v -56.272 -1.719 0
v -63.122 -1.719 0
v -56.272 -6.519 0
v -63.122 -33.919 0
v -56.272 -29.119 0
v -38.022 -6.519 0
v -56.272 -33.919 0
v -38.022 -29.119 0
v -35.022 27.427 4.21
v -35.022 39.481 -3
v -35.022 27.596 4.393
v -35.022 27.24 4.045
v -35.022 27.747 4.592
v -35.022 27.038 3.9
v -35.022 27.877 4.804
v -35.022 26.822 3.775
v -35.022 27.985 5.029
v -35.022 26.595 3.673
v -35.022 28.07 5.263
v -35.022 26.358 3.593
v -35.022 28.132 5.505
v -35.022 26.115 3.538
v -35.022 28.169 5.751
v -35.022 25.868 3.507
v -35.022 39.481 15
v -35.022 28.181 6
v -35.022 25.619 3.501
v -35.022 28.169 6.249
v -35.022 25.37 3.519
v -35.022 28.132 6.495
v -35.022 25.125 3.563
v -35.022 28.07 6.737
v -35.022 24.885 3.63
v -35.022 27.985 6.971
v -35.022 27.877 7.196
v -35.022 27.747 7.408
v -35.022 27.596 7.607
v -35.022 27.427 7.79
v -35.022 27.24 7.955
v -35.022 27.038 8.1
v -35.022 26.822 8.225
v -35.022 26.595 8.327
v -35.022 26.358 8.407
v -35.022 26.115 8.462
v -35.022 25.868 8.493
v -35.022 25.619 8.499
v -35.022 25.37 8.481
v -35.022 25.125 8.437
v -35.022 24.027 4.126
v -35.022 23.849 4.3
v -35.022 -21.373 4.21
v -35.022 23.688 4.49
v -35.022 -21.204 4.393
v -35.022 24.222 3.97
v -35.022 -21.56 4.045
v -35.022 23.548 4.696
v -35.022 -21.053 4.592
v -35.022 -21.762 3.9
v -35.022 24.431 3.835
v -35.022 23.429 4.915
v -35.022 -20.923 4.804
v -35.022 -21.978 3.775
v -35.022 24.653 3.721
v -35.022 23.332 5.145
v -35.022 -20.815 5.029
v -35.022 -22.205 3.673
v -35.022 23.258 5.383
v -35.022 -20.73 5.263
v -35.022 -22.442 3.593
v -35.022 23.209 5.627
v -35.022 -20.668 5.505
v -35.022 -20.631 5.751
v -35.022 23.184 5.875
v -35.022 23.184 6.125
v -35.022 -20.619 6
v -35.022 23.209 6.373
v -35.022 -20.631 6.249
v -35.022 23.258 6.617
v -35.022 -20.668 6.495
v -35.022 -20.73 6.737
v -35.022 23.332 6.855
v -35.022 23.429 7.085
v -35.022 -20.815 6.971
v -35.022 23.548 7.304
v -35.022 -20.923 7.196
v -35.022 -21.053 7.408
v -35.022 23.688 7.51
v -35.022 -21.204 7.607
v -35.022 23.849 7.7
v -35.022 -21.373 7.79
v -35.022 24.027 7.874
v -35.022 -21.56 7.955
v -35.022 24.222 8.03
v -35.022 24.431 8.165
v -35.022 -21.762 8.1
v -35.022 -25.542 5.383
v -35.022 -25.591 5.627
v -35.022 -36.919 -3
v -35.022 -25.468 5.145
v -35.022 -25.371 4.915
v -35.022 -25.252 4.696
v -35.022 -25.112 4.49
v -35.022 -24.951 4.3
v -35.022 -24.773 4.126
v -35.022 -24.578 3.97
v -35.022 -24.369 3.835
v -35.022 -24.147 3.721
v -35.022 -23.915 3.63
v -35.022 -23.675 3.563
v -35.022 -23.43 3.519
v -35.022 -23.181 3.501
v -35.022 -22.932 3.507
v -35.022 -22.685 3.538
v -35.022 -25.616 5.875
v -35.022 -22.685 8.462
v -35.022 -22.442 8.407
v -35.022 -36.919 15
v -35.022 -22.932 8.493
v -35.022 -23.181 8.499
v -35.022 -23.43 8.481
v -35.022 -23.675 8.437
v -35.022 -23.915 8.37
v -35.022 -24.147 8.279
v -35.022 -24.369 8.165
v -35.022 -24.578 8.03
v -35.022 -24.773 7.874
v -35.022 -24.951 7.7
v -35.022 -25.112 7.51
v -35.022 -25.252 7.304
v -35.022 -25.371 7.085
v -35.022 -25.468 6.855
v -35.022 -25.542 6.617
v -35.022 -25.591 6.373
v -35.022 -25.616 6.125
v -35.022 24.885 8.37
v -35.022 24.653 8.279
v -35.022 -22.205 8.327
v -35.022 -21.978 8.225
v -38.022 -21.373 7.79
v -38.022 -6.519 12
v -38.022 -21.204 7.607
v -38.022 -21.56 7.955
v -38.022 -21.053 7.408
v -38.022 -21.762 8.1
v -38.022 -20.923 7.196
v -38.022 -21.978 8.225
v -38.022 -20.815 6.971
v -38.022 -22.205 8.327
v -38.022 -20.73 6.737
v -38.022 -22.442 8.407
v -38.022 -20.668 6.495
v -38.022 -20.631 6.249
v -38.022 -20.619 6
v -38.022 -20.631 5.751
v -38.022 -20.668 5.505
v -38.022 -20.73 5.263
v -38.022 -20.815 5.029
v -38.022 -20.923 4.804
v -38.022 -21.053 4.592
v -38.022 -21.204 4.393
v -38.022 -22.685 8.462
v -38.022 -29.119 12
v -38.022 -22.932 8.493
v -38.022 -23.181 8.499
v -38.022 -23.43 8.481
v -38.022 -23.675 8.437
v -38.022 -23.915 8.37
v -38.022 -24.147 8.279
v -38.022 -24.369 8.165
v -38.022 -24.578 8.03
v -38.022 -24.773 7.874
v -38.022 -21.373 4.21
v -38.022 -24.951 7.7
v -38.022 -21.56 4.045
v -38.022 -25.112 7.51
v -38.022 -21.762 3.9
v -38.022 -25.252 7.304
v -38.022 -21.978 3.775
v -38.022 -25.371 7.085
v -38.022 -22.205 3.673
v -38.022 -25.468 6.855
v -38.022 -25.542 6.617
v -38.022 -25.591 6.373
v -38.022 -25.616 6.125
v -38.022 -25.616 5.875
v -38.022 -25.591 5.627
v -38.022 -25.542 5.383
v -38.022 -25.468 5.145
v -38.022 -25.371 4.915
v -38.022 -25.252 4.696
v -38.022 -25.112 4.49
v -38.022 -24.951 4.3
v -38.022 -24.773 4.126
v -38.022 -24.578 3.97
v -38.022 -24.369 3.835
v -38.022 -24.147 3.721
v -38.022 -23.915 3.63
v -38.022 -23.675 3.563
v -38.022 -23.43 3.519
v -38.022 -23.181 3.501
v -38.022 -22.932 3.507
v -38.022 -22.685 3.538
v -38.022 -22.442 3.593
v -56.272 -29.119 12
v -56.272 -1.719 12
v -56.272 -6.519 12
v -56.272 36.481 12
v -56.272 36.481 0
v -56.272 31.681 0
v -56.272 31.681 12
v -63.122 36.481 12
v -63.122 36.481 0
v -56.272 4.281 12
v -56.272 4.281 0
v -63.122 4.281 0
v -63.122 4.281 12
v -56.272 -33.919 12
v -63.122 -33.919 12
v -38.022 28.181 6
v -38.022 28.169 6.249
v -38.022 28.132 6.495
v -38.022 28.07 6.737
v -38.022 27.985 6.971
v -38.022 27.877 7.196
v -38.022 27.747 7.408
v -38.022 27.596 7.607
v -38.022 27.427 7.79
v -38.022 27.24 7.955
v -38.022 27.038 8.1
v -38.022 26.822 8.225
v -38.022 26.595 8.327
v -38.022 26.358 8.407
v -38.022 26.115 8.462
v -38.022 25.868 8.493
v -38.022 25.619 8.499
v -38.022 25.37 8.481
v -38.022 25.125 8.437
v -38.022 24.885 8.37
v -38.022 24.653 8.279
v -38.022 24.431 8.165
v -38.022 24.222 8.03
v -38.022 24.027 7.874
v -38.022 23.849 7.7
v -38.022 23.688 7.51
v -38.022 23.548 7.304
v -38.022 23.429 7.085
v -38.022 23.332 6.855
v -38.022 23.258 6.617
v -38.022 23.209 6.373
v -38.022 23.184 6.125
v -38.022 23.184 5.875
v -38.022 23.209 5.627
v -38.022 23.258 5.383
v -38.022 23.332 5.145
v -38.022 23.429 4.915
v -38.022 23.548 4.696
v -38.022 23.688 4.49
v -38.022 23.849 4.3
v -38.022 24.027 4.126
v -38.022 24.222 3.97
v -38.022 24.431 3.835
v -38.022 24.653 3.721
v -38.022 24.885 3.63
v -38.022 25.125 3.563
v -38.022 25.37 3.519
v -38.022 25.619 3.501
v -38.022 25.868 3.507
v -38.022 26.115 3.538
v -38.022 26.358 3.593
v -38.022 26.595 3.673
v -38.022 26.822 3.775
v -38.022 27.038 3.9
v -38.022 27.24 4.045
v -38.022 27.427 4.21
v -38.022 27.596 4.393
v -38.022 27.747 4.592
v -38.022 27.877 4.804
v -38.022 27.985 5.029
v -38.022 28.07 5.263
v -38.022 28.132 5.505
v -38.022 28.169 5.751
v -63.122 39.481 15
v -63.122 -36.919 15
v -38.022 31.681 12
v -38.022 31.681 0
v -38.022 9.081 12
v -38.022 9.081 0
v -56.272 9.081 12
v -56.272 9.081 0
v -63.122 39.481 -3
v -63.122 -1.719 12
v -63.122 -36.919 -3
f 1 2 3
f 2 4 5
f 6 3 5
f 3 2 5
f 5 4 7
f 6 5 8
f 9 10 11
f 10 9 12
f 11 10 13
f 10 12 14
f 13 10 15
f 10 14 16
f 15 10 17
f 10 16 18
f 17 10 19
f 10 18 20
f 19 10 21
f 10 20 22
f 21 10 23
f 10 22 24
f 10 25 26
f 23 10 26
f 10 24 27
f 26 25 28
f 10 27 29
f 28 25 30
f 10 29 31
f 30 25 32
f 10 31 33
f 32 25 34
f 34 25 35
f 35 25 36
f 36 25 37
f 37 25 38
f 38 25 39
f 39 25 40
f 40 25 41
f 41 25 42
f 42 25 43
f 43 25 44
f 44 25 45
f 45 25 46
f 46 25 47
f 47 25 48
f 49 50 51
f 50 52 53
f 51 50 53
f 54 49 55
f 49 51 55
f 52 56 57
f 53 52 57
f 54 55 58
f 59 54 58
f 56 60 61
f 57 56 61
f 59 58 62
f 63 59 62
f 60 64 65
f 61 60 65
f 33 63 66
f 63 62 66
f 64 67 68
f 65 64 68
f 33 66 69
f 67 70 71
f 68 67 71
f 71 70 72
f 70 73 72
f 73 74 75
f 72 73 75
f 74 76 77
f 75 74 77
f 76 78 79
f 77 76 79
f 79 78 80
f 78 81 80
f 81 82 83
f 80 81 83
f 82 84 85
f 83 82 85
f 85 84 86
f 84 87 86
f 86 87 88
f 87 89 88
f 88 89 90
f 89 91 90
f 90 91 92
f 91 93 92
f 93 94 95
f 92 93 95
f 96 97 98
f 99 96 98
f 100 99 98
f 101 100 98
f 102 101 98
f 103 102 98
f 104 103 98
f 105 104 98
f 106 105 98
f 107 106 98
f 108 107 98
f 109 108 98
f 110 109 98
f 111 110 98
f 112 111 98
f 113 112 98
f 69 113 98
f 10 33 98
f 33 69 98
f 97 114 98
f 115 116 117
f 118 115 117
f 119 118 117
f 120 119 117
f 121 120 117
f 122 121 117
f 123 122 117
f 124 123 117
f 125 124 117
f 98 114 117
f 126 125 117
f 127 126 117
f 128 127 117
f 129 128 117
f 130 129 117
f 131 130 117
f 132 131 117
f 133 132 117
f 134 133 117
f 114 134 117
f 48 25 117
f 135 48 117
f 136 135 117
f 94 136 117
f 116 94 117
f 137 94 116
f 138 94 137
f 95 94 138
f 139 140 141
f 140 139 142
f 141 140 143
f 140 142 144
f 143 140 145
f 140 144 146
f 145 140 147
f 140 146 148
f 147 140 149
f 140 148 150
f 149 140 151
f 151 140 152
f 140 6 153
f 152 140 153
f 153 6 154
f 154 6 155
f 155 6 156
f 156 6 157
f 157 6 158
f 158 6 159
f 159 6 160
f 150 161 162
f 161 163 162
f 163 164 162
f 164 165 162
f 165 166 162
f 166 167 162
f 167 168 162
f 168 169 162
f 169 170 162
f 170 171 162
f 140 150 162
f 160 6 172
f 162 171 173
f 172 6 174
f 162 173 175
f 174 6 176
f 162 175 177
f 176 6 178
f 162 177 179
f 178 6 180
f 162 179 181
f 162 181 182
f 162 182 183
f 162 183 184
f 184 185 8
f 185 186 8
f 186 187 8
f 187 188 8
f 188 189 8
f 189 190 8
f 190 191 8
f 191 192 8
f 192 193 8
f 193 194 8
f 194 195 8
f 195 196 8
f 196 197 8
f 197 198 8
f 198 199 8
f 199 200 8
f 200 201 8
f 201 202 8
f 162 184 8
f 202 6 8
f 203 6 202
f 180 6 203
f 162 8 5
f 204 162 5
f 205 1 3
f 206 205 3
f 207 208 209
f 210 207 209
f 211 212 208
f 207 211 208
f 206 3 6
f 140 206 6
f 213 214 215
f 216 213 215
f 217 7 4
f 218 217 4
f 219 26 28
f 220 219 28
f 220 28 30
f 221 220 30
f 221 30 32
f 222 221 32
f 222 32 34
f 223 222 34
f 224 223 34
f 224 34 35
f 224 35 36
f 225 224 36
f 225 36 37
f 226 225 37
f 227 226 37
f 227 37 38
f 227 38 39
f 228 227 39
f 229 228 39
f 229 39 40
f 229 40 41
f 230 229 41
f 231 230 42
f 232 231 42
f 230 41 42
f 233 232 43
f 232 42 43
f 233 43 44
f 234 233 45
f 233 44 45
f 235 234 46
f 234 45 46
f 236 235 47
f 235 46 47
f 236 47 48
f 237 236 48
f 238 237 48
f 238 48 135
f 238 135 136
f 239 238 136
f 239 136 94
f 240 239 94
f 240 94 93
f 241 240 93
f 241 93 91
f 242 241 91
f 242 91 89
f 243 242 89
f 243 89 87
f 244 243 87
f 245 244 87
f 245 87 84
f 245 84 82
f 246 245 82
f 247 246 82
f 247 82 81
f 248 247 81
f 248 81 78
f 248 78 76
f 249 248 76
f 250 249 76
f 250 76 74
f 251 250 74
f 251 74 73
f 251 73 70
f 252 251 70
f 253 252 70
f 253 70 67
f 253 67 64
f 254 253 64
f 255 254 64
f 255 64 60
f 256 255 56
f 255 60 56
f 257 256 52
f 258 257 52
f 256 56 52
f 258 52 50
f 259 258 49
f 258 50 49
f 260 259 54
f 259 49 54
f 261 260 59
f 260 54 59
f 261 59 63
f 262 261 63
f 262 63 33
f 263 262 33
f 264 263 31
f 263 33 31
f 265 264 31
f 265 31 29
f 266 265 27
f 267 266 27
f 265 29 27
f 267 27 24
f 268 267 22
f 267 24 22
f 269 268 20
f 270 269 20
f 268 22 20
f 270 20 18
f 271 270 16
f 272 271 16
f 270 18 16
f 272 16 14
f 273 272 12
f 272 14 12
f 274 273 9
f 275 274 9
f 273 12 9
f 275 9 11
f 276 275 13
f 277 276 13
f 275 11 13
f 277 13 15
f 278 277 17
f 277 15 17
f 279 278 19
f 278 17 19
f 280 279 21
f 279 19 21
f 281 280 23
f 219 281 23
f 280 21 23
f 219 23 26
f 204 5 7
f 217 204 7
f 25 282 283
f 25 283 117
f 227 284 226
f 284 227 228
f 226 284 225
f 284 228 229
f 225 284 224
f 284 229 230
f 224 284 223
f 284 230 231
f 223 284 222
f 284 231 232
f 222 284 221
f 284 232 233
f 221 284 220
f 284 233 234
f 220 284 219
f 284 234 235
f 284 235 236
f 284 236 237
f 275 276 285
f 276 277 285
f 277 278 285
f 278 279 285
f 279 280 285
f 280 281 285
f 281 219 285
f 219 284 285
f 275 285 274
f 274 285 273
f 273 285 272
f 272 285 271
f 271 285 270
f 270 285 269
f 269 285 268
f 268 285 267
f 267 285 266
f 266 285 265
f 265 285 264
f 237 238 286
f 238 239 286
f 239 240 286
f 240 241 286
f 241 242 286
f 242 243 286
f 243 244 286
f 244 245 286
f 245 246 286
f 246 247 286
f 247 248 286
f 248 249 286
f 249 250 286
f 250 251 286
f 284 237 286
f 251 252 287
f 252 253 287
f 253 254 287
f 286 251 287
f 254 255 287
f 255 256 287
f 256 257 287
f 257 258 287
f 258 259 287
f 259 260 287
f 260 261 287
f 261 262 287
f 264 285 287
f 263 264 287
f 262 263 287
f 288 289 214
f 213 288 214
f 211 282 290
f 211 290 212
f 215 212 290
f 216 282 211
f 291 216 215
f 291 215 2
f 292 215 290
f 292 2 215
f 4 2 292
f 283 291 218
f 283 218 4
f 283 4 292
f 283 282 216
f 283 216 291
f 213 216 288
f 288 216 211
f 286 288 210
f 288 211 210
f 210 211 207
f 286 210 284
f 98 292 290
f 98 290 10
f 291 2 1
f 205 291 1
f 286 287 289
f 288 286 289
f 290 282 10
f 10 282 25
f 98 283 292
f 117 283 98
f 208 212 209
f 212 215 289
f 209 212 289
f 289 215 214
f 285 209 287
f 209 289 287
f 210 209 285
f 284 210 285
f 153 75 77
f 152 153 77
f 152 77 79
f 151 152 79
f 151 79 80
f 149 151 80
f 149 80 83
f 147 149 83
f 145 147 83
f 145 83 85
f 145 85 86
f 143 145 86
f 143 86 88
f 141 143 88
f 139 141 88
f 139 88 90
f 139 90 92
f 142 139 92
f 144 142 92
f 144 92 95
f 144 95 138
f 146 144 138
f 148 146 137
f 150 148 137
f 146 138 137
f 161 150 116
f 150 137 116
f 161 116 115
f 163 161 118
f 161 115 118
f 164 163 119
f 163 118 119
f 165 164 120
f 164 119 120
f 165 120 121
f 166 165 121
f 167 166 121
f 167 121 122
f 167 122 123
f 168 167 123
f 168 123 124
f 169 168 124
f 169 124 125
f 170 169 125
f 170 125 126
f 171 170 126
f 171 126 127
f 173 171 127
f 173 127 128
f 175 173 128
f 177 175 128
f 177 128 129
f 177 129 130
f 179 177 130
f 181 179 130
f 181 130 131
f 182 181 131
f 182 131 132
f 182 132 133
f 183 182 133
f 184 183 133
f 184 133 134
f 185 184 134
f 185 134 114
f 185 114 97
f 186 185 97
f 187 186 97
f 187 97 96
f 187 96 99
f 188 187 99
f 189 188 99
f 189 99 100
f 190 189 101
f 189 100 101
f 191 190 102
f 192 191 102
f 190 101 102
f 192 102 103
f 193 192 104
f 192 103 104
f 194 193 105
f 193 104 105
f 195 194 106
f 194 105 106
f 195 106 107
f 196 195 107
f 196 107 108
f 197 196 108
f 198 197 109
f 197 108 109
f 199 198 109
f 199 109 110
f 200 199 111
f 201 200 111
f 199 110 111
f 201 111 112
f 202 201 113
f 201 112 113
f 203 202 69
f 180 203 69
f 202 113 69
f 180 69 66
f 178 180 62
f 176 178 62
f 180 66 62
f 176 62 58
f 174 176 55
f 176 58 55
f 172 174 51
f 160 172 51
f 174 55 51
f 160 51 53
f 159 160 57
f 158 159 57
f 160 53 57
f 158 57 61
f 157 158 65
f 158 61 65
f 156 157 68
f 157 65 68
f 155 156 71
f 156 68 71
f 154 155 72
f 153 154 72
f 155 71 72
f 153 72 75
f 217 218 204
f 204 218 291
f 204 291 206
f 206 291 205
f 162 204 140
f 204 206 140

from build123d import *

# Parameters (mm, degrees)
F2_DEPTH = 12
F3_W     = 28.1
F3_H     = 76.4
F7_DEPTH = 3
F4_W     = 28.1
F4_H     = 76.4
F8_DEPTH = 3
F9_D     = 5
F10_D    = 5


with BuildPart() as f2:
    # F1 (on Top) → F2 (new body)
    with BuildSketch(Plane.XY):
        Polygon((-35.0215807557, 39.4811810493), (-63.1215807557, 39.4811810493), (-63.1215807557, 36.4811810493), (-56.2715807557, 36.4811810493), (-56.2715807557, 31.6811810493), (-38.0215807557, 31.6811810493), (-38.0215807557, 9.0811810493), (-56.2715807557, 9.0811810493), (-56.2715807557, 4.2811810493), (-63.1215807557, 4.2811810493), (-63.1215807557, -1.7188189507), (-56.2715807557, -1.7188189507), (-56.2715807557, -6.5188189507), (-38.0215807557, -6.5188189507), (-38.0215807557, -29.1188189507), (-56.2715807557, -29.1188189507), (-56.2715807557, -33.9188189507), (-63.1215807557, -33.9188189507), (-63.1215807557, -36.9188189507), (-35.0215807557, -36.9188189507), align=None)
    extrude(amount=F2_DEPTH)

    # F3 (on face) → F7 (join)
    with BuildSketch(Plane.XY.offset(12)):
        with Locations((-49.0715807557, 1.2811810493)):
            Rectangle(F3_W, F3_H)
    extrude(amount=F7_DEPTH)

    # F4 (on face) → F8 (join)
    with BuildSketch(Plane(origin=(0, 0, 0), x_dir=(1, 0, 0), z_dir=(0, 0, -1))):
        with Locations((-49.0715807557, -1.2811810493)):
            Rectangle(F4_W, F4_H)
    extrude(amount=F8_DEPTH)

    # F9 (through all)
    with Locations(Plane(origin=(-38.0215807557, 0, 0), x_dir=(0, -1, 0), z_dir=(-1, 0, 0))):
        with Locations((-25.6811810493, 6)):
            Hole(F9_D / 2)

    # F10 (through all)
    with Locations(Plane(origin=(-38.0215807557, 0, 0), x_dir=(0, -1, 0), z_dir=(-1, 0, 0))):
        with Locations((23.1188189507, 6)):
            Hole(F10_D / 2)


solid = f2.part
